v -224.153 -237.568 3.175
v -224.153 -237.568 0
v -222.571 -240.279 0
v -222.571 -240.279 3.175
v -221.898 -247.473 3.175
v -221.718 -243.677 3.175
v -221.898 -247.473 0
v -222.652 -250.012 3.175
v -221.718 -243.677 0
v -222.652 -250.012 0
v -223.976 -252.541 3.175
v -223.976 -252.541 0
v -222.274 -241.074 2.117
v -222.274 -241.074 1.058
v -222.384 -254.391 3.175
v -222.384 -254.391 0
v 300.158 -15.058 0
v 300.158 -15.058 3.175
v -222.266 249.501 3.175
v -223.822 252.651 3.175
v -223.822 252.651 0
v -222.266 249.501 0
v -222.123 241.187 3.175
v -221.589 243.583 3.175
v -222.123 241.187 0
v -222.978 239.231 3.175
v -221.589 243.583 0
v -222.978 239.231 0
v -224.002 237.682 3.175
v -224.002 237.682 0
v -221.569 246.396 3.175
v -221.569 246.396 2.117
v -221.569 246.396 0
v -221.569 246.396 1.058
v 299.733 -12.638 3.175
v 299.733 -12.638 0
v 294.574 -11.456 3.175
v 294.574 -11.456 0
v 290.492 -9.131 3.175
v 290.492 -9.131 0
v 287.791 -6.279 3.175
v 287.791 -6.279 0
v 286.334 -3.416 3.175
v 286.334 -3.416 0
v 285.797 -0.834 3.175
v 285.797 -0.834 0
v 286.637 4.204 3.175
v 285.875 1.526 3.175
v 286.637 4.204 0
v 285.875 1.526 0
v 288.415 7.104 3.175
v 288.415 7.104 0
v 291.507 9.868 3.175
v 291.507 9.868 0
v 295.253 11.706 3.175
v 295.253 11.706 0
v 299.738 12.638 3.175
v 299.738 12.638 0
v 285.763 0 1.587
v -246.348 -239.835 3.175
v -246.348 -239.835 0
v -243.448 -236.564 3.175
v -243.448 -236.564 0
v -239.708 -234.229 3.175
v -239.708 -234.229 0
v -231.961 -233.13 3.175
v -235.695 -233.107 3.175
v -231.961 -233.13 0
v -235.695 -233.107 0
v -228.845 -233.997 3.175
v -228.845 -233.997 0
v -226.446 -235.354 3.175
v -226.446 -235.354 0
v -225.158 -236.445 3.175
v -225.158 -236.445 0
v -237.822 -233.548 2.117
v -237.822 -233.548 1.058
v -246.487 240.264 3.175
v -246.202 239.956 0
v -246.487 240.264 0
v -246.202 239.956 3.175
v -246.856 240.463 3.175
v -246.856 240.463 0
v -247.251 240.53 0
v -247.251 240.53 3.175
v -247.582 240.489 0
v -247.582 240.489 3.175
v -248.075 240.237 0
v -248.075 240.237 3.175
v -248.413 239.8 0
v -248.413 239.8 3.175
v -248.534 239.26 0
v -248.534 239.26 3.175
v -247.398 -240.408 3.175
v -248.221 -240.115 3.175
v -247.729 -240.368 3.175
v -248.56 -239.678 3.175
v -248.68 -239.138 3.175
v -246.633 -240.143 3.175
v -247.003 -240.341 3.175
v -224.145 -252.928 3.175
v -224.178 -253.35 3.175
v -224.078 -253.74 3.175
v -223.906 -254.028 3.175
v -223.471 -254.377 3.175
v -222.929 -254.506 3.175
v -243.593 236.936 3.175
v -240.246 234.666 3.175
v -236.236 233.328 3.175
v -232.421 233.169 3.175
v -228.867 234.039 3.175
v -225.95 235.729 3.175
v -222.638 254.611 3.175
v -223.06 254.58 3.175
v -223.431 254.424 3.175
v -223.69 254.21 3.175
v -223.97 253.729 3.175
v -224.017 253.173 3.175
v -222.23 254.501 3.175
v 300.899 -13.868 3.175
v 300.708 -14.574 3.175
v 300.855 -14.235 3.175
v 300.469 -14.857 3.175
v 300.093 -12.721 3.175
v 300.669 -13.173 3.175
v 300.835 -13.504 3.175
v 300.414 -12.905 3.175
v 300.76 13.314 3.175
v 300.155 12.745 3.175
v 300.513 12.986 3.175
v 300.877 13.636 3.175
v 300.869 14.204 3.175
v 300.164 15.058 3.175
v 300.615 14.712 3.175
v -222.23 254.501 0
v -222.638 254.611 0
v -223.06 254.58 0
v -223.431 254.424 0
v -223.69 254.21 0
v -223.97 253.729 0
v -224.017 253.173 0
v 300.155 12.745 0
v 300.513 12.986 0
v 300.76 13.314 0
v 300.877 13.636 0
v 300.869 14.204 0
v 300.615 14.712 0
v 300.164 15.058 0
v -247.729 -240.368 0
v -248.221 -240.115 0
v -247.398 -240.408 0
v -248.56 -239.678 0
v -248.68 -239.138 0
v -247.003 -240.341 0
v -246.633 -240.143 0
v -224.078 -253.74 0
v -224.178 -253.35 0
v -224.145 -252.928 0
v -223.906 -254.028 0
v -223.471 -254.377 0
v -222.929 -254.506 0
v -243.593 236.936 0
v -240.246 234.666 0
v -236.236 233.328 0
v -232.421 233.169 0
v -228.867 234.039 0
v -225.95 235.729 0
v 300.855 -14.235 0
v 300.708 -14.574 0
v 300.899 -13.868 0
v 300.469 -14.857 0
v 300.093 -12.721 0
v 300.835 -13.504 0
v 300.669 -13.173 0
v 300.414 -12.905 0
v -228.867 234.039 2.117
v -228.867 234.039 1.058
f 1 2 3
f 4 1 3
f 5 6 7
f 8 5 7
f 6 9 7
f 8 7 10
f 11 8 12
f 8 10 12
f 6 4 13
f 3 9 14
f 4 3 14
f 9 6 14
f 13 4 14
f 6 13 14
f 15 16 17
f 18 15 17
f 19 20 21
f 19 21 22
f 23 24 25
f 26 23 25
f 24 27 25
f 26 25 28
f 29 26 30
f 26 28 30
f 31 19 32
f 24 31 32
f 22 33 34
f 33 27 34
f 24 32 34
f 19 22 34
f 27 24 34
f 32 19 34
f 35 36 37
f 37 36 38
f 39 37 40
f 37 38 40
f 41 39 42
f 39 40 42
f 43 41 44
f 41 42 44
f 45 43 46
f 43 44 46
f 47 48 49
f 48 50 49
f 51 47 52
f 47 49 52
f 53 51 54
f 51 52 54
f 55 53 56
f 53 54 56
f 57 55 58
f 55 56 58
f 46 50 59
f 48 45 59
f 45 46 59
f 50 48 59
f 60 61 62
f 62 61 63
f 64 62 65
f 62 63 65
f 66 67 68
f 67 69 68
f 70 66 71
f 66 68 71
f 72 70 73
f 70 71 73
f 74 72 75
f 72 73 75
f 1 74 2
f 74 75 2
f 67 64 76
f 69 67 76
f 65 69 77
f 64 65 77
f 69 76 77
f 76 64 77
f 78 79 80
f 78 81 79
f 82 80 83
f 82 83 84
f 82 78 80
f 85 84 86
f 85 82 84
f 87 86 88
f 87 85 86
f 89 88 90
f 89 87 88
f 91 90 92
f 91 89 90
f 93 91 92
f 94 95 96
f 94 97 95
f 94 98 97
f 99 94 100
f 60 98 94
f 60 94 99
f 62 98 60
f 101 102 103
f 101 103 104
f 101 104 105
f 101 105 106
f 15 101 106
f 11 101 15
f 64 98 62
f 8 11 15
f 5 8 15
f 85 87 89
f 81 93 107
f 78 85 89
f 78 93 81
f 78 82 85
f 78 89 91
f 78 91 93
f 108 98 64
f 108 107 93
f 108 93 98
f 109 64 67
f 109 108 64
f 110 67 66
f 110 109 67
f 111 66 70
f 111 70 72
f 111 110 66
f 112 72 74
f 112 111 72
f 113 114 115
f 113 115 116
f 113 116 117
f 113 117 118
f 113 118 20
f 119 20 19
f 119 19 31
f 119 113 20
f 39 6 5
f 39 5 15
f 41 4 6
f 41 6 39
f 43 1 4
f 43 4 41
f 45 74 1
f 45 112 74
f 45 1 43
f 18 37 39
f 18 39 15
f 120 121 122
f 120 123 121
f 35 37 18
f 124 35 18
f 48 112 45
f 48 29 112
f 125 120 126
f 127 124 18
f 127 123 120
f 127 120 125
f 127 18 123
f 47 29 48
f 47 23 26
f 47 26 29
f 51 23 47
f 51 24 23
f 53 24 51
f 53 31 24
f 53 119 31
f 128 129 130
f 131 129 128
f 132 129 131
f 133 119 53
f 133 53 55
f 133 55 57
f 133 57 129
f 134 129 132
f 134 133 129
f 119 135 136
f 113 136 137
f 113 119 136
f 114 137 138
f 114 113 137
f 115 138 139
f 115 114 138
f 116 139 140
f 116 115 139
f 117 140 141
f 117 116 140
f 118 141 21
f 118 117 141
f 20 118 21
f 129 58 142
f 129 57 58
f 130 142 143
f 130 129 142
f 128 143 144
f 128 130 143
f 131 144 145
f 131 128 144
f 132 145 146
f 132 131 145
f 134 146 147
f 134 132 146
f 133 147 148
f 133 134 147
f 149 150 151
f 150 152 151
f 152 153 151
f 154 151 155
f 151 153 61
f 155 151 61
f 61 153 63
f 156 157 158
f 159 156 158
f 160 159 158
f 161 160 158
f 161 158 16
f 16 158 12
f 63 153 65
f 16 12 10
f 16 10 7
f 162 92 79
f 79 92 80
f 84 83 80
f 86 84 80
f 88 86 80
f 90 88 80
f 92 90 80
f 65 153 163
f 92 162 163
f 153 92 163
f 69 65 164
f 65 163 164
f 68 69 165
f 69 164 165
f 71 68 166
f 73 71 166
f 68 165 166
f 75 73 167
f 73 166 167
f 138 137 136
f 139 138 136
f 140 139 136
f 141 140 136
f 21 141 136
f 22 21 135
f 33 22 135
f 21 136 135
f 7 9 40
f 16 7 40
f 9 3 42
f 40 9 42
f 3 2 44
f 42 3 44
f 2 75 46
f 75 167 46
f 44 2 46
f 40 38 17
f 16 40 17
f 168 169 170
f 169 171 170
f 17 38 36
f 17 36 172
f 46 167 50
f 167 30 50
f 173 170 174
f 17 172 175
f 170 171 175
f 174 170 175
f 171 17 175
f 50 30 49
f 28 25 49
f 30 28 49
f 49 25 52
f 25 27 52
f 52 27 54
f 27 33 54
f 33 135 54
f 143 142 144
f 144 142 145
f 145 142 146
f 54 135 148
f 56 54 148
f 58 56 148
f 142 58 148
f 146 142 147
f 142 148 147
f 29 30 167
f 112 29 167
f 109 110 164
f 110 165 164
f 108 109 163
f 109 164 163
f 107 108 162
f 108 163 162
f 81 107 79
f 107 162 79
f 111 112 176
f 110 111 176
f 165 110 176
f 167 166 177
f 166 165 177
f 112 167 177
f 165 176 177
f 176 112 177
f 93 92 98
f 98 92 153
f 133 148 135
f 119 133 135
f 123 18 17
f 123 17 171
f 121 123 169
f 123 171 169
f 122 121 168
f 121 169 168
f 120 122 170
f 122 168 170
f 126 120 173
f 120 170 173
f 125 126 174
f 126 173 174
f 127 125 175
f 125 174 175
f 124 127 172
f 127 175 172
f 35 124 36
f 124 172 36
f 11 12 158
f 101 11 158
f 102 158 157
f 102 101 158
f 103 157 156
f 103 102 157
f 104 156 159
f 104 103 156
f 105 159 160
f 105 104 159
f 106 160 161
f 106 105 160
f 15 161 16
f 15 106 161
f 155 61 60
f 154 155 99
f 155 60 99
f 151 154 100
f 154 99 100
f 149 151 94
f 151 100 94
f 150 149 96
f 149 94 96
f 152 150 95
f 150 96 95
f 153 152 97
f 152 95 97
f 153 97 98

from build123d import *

# Parameters (mm, degrees)
BOSS_EXTRUDE1_DEPTH = 3.175
FILLET1_R           = 1.27


with BuildPart() as part:
    # Sketch2 → Boss-Extrude1 (new body)
    with BuildSketch(Plane.XY):
        with BuildLine():
            add(Edge.make_bspline(
                [(-224.002225489, 237.681676079), (-232.004852581, 227.466830346), (-248.536961255, 229.708235903), (-248.531511338, 247.553045118)],
                knots=[0, 0, 0, 0, 0.379035755, 0.379035755, 0.379035755, 0.379035755], degree=3, weights=[1, 0.494618994, 0.37235293, 0.633201808]))
            Line((-248.531511338, 247.553045118), (-248.68268269, -247.431362977))
            add(Edge.make_bspline(
                [(-248.68268269, -247.431362977), (-248.677234709, -229.592890963), (-232.152010305, -227.358084205), (-224.153396841, -237.567806796)],
                knots=[0.621058297, 0.621058297, 0.621058297, 0.621058297, 1, 1, 1, 1], degree=3, weights=[0.633007703, 0.37241363, 0.494744396, 1]))
            add(Edge.make_bspline(
                [(-224.153396841, -237.567806796), (-219.422565419, -243.606412946), (-220.040878469, -253.31787844), (-230.404432953, -258.064554967)],
                knots=[0, 0, 0, 0, 0.282425472, 0.282425472, 0.282425472, 0.282425472], degree=3, weights=[1, 0.623432704, 0.459569801, 0.50841129]))
            Line((-230.404432953, -258.064554967), (308.83327514, -11.084913444))
            add(Edge.make_bspline(
                [(308.83327514, -11.084913444), (295.43695815, -17.220644529), (285.763127193, -9.203898597), (285.763127193, 0)],
                knots=[0.684854095, 0.684854095, 0.684854095, 0.684854095, 1, 1, 1, 1], degree=3, weights=[0.533951912, 0.424456097, 0.57980546, 1]))
            add(Edge.make_bspline(
                [(285.763127193, 0), (285.763127193, 9.206022551), (295.440494393, 17.223574641), (308.837548746, 11.082955337)],
                knots=[0, 0, 0, 0, 0.315188067, 0.315188067, 0.315188067, 0.315188067], degree=3, weights=[1, 0.579749243, 0.424414534, 0.533995873]))
            Line((308.837548746, 11.082955337), (-230.249394824, 258.176652546))
            add(Edge.make_bspline(
                [(-230.249394824, 258.176652546), (-219.88947652, 253.42812256), (-219.272438092, 243.718949596), (-224.002225489, 237.681676079)],
                knots=[0.717613388, 0.717613388, 0.717613388, 0.717613388, 1, 1, 1, 1], degree=3, weights=[0.508391141, 0.459614898, 0.623484517, 1]))
        make_face()
    extrude(amount=BOSS_EXTRUDE1_DEPTH)

    # Fillet1
    fillet1_edges = [part.edges().sort_by_distance(p)[0] for p in [
        (-230.249394824, 258.176652546, 1.5875),
    ]]
    fillet(fillet1_edges, radius=FILLET1_R)
    fillet1_2_edges = [part.edges().sort_by_distance(p)[0] for p in [
        (-248.531511338, 247.553045118, 1.5875),
    ]]
    fillet(fillet1_2_edges, radius=FILLET1_R)
    fillet1_3_edges = [part.edges().sort_by_distance(p)[0] for p in [
        (-230.404432953, -258.064554967, 1.5875),
    ]]
    fillet(fillet1_3_edges, radius=FILLET1_R)
    fillet1_4_edges = [part.edges().sort_by_distance(p)[0] for p in [
        (308.837548746, 11.082955337, 1.5875),
    ]]
    fillet(fillet1_4_edges, radius=FILLET1_R)
    fillet1_5_edges = [part.edges().sort_by_distance(p)[0] for p in [
        (-248.68268269, -247.431362977, 1.5875),
    ]]
    fillet(fillet1_5_edges, radius=FILLET1_R)
    # the kernel refuses this fillet: 1.27 mm, written as the material it takes off along each edge
    with BuildSketch(Plane(origin=(308.833274988, -11.084913514, -23.853565642), x_dir=(-0.909173978372099, -0.4164164706769535, 0), z_dir=(0, 0, 1))) as fillet1_6_piece_1:
        with BuildLine():
            CenterArc((9.54142609, -1.27), FILLET1_R, 90, 150.734300738)
            Line((8.920573521, -2.377899855), (8.908156469, -2.400057852))
            ThreePointArc((8.908156469, -2.400057852), (4.606653366, -0.645600152), (0, -0.0254))
            Line((0, -0.0254), (0, 0.0254))
            Line((0, 0.0254), (9.54142609, 0.0254))
            Line((9.54142609, 0.0254), (9.54142609, 0))
        make_face()
    extrude(amount=50.882131284, mode=Mode.SUBTRACT)


solid = part.part
